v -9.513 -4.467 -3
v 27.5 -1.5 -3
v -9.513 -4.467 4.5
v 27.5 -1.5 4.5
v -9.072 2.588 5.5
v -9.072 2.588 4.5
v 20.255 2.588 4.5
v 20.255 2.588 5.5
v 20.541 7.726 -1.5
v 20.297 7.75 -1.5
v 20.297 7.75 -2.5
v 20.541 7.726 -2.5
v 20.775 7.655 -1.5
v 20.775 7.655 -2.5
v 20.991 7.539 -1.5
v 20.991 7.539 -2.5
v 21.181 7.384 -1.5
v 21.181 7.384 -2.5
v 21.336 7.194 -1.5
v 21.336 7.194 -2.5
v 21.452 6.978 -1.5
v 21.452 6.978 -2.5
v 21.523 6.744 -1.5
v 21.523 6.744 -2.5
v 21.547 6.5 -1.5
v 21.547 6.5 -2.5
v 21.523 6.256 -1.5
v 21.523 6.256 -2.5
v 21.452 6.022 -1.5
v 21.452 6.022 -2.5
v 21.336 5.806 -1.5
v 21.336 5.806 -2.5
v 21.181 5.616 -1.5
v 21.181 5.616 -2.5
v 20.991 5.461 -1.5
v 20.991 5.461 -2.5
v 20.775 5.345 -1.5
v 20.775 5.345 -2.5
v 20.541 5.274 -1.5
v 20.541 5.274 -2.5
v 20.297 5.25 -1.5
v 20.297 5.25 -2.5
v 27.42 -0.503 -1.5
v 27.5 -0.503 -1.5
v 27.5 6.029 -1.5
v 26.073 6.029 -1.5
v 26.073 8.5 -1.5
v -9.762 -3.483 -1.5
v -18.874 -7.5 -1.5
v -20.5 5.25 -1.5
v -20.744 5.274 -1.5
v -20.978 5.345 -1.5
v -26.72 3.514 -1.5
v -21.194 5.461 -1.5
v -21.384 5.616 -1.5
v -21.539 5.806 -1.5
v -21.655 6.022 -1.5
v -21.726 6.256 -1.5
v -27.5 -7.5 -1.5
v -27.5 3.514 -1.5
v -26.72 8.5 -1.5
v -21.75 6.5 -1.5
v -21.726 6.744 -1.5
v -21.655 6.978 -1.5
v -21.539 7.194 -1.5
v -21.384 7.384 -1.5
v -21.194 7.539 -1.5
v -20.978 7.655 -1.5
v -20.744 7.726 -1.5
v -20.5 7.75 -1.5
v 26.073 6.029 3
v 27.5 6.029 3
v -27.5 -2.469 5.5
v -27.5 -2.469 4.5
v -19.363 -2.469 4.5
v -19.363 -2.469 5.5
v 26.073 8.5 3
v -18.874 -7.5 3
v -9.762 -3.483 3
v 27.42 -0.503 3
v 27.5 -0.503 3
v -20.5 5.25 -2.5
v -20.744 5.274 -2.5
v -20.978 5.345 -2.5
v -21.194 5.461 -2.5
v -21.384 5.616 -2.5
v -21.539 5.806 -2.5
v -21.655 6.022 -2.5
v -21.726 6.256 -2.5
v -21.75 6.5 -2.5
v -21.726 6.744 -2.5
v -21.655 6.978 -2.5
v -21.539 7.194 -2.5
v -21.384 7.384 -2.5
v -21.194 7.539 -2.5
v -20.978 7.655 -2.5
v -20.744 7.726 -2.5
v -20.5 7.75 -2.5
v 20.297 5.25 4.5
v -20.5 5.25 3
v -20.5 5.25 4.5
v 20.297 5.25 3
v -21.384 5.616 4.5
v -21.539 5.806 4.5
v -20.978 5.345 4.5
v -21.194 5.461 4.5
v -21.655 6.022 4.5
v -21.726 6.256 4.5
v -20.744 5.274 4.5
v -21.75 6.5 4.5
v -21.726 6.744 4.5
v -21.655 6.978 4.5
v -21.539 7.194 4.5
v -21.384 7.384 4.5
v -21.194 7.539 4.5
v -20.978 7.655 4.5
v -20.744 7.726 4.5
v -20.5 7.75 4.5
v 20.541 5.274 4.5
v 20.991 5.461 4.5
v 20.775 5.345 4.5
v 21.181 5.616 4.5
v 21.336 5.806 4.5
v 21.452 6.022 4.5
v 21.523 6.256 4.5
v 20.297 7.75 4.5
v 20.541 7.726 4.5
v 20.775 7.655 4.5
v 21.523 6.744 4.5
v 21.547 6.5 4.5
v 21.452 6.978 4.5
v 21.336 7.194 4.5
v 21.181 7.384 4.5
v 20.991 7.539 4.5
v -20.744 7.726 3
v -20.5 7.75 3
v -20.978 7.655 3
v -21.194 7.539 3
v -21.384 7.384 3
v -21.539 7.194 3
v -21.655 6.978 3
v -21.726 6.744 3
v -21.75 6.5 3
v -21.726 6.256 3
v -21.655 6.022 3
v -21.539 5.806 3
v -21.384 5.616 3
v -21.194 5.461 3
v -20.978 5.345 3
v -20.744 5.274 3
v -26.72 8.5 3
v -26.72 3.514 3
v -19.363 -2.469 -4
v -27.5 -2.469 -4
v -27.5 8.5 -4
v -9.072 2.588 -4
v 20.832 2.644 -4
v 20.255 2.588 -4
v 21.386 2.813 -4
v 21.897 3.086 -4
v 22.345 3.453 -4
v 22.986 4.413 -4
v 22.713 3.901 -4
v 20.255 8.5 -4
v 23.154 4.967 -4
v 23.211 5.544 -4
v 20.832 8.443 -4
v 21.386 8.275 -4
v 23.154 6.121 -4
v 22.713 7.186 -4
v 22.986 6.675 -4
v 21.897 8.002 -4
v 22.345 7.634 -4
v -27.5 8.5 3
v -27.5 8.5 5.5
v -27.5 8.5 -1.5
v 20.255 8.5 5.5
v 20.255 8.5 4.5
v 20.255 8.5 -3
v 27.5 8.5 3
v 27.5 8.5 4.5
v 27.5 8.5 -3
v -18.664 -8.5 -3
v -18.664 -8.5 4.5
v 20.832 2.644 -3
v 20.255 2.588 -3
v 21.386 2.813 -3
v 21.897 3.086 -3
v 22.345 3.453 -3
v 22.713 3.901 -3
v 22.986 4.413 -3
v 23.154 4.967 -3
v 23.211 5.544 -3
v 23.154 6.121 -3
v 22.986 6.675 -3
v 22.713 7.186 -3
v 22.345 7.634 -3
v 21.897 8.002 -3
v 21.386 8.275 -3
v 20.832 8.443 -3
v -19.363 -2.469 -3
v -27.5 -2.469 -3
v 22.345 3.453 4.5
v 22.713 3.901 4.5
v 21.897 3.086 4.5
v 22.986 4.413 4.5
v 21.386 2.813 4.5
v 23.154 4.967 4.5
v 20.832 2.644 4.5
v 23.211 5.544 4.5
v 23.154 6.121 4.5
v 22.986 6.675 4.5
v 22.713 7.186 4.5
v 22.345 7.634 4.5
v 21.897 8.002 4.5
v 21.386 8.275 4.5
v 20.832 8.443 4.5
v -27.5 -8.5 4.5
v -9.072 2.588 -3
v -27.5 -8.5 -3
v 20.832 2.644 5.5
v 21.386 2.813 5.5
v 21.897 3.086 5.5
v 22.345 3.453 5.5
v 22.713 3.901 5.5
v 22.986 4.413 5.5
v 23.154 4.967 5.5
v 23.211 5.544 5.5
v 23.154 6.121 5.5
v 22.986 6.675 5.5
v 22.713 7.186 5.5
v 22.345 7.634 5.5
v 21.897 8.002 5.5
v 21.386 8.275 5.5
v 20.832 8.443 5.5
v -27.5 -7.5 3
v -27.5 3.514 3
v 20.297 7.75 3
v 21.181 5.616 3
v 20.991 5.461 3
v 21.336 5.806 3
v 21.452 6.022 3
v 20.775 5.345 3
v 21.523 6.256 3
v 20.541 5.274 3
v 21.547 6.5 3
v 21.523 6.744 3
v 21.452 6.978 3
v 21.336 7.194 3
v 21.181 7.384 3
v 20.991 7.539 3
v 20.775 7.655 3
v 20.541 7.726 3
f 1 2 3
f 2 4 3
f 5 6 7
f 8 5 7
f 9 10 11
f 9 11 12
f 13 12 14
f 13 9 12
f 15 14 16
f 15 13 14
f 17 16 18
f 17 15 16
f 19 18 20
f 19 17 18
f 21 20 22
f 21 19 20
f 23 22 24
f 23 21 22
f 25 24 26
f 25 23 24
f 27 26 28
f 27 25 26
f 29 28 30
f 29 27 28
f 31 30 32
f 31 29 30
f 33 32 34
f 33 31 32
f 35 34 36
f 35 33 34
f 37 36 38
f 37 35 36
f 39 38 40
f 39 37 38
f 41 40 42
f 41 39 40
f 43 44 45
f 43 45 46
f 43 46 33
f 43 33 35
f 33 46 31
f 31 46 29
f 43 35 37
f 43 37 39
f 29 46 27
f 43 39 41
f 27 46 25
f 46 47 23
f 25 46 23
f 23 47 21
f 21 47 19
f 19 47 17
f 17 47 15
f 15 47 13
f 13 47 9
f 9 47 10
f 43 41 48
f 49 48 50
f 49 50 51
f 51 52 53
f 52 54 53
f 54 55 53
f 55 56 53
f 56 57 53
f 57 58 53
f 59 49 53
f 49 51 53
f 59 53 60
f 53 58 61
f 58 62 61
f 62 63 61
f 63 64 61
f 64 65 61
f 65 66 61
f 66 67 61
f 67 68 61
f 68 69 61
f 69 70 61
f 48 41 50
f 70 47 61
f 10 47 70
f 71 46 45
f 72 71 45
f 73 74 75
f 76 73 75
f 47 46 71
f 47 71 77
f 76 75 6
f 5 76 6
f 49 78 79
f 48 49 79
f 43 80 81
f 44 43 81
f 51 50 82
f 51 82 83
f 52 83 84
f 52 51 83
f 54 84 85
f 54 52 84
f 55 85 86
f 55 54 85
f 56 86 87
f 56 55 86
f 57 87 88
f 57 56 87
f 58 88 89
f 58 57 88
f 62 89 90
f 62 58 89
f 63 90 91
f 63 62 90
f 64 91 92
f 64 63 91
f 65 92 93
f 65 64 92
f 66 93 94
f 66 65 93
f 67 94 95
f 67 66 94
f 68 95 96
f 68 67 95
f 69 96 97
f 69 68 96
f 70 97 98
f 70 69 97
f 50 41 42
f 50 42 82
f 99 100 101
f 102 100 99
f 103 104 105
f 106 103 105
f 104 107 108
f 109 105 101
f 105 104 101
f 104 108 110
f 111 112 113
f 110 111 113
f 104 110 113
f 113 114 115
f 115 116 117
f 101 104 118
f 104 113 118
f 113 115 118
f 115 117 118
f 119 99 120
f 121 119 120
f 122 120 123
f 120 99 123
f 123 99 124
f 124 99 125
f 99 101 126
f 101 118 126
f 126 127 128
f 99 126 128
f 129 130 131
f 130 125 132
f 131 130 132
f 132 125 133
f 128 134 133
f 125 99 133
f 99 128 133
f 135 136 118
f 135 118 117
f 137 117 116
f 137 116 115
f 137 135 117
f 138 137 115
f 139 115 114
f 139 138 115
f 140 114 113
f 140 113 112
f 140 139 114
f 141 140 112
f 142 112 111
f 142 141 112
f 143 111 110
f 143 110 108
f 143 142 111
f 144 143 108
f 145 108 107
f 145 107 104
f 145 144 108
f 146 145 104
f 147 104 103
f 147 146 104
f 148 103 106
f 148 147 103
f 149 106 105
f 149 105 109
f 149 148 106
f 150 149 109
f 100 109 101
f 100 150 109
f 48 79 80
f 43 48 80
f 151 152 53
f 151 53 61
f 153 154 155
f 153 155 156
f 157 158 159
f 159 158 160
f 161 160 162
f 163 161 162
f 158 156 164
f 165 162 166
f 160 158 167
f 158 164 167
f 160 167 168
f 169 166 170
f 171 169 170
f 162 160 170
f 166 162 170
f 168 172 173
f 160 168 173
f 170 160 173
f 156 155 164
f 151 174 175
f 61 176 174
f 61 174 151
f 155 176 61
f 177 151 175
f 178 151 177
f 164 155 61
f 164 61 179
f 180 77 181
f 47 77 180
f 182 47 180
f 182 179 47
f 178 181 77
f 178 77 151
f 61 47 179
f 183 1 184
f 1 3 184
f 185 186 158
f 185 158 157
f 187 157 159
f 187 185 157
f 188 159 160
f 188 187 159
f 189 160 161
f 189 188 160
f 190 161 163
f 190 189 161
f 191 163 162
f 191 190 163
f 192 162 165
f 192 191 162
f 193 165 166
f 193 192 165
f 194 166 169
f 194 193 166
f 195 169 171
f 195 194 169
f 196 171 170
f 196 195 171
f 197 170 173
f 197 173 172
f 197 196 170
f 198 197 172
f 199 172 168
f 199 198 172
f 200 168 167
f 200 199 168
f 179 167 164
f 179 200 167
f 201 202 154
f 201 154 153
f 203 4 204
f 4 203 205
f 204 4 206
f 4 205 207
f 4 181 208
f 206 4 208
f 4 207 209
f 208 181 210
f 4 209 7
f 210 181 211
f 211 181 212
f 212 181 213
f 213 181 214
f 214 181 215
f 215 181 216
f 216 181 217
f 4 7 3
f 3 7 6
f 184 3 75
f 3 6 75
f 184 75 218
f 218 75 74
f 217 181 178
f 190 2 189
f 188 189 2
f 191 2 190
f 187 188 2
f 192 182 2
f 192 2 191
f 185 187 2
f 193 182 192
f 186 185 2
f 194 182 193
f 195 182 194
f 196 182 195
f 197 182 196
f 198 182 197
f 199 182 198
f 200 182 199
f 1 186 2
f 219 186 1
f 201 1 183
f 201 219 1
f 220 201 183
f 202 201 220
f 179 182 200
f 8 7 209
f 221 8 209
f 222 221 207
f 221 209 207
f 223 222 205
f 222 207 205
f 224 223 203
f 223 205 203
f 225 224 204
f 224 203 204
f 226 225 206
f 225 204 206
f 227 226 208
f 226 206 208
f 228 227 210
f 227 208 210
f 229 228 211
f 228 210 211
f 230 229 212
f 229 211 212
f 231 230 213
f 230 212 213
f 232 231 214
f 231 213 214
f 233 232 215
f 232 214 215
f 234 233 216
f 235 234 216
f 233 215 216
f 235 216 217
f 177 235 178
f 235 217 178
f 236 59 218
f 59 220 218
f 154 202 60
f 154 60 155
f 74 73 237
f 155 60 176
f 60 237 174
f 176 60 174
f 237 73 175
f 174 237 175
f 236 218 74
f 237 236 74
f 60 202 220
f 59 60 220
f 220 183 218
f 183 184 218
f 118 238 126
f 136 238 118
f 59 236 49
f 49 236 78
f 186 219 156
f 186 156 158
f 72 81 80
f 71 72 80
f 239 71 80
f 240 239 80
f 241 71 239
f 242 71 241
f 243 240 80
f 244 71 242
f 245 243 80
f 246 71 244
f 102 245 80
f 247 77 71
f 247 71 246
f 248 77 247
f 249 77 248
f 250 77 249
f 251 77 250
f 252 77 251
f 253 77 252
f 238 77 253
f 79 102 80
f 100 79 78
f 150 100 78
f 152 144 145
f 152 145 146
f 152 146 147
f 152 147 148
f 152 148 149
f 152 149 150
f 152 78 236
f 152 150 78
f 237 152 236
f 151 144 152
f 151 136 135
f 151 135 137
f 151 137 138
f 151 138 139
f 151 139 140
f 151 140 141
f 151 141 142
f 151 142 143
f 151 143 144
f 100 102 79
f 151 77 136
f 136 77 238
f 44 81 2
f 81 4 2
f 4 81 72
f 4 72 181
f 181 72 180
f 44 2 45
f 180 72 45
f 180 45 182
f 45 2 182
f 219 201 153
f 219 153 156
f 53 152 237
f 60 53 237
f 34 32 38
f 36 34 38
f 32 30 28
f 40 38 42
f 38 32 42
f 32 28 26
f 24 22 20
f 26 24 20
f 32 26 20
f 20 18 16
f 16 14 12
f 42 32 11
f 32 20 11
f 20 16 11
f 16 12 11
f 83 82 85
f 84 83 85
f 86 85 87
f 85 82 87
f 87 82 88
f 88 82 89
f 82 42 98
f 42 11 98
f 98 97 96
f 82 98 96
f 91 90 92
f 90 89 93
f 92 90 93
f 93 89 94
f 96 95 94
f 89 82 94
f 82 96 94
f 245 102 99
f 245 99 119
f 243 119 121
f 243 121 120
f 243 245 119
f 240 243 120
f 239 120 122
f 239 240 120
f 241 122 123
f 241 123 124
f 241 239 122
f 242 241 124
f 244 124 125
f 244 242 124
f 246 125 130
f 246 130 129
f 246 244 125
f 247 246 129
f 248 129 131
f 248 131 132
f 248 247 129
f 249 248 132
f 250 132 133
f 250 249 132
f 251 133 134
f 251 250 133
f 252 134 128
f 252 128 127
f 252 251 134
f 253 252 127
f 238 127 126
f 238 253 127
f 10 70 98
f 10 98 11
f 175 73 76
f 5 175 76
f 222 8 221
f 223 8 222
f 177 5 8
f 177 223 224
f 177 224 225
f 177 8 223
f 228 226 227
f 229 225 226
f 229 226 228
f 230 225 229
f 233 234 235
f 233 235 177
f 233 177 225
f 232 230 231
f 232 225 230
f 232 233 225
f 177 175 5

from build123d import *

# Parameters (mm, degrees)
BOSS_EXTRUDE1_START = 3
BOSS_EXTRUDE1_DEPTH = 1.5
BOSS_EXTRUDE2_DEPTH = 1
CUT_EXTRUDE1_DEPTH  = 1.5
BOSS_EXTRUDE3_START = -3
BOSS_EXTRUDE3_DEPTH = 1.5
BOSS_EXTRUDE4_DEPTH = 1
BOSS_EXTRUDE5_DEPTH = 4.5
CUT_EXTRUDE2_DEPTH  = 1
SKETCH10_W          = 0.780201508
SKETCH10_H          = 4.986255627
BOSS_EXTRUDE6_DEPTH = 4.5
SKETCH11_W          = 1.426663005
SKETCH11_H          = 2.471476461
BOSS_EXTRUDE7_DEPTH = 4.5


with BuildPart() as part:
    # Sketch1 → Boss-Extrude1 (new body)
    with BuildSketch(Plane.XY.offset(BOSS_EXTRUDE1_START)):
        Polygon((-9.513255025, -4.466723996), (-18.663811547, -8.5), (-27.5, -8.5), (-27.5, 8.5), (27.5, 8.5), (27.5, -1.5), align=None)
    extrude(amount=BOSS_EXTRUDE1_DEPTH)

    # Sketch2 → Boss-Extrude2 (add)
    with BuildSketch(Plane.XY.offset(4.5)):
        with BuildLine():
            Line((-27.5, -2.468678655), (-19.36276873, -2.468678655))
            Line((-19.36276873, -2.468678655), (-9.07165048, 2.587651121))
            Line((-9.07165048, 2.587651121), (20.25506222, 2.587651121))
            ThreePointArc((20.25506222, 2.587651121), (23.21123666, 5.54382556), (20.25506222, 8.5))
            Line((20.25506222, 8.5), (-27.5, 8.5))
            Line((-27.5, 8.5), (-27.5, -2.468678655))
        make_face()
    extrude(amount=BOSS_EXTRUDE2_DEPTH)

    # Sketch3 → Cut-Extrude1 (cut)
    with BuildSketch(Plane(origin=(0, 0, 3), x_dir=(-1, 0, 0), z_dir=(0, 0, -1))):
        with BuildLine():
            Line((-20.296822584, 7.75), (20.5, 7.75))
            ThreePointArc((20.5, 7.75), (21.75, 6.5), (20.5, 5.25))
            Line((20.5, 5.25), (-20.296822584, 5.25))
            ThreePointArc((-20.296822584, 5.25), (-21.546822584, 6.5), (-20.296822584, 7.75))
        make_face()
    extrude(amount=-CUT_EXTRUDE1_DEPTH, mode=Mode.SUBTRACT)



with BuildPart() as body_2:
    # Sketch5 → Boss-Extrude3 (new body)
    with BuildSketch(Plane.XY.offset(BOSS_EXTRUDE3_START)):
        Polygon((27.5, -1.5), (-9.513255025, -4.466723996), (-18.663811547, -8.5), (-27.5, -8.5), (-27.5, 8.5), (27.5, 8.5), align=None)
    extrude(amount=BOSS_EXTRUDE3_DEPTH)

    # Sketch7 → Boss-Extrude4 (add)
    with BuildSketch(Plane(origin=(0, 0, -3), x_dir=(-1, 0, 0), z_dir=(0, 0, -1))):
        with BuildLine():
            Line((-20.25506222, 8.5), (27.5, 8.5))
            Line((27.5, 8.5), (27.5, -2.468678655))
            Line((27.5, -2.468678655), (19.36276873, -2.468678655))
            Line((19.36276873, -2.468678655), (9.07165048, 2.587651121))
            Line((9.07165048, 2.587651121), (-20.25506222, 2.587651121))
            ThreePointArc((-20.25506222, 2.587651121), (-23.21123666, 5.54382556), (-20.25506222, 8.5))
        make_face()
    extrude(amount=BOSS_EXTRUDE4_DEPTH)


with BuildPart() as part_1:
    add(part.part)

    add(body_2.part)  # Boss-Extrude5 merges body 2
    # Sketch8 → Boss-Extrude5 (add)
    with BuildSketch(Plane(origin=(0, 0, 3), x_dir=(-1, 0, 0), z_dir=(0, 0, -1))):
        Polygon((-27.5, -0.503196857), (-27.5, -1.5), (9.513255025, -4.466723996), (18.663811547, -8.5), (27.5, -8.5), (27.5, -7.5), (26.5, -7.5), (18.874420362, -7.5), (9.761781861, -3.483437061), (-27.420103222, -0.503196857), align=None)
    extrude(amount=BOSS_EXTRUDE5_DEPTH)

    # Sketch9 → Cut-Extrude2 (cut)
    with BuildSketch(Plane.XY.offset(-1.5)):
        with BuildLine():
            Line((-20.5, 7.75), (20.296822584, 7.75))
            ThreePointArc((20.296822584, 7.75), (21.546822584, 6.5), (20.296822584, 5.25))
            Line((20.296822584, 5.25), (-20.5, 5.25))
            ThreePointArc((-20.5, 5.25), (-21.75, 6.5), (-20.5, 7.75))
        make_face()
    extrude(amount=-CUT_EXTRUDE2_DEPTH, mode=Mode.SUBTRACT)

    # Sketch10 → Boss-Extrude6 (add)
    with BuildSketch(Plane(origin=(0, 0, 3), x_dir=(-1, 0, 0), z_dir=(0, 0, -1))):
        with Locations((27.109899246, 6.006872186)):
            Rectangle(SKETCH10_W, SKETCH10_H)
    extrude(amount=BOSS_EXTRUDE6_DEPTH)

    # Sketch11 → Boss-Extrude7 (add)
    with BuildSketch(Plane.XY.offset(-1.5)):
        with Locations((26.786668498, 7.26426177)):
            Rectangle(SKETCH11_W, SKETCH11_H)
    extrude(amount=BOSS_EXTRUDE7_DEPTH)


solid = part_1.part
